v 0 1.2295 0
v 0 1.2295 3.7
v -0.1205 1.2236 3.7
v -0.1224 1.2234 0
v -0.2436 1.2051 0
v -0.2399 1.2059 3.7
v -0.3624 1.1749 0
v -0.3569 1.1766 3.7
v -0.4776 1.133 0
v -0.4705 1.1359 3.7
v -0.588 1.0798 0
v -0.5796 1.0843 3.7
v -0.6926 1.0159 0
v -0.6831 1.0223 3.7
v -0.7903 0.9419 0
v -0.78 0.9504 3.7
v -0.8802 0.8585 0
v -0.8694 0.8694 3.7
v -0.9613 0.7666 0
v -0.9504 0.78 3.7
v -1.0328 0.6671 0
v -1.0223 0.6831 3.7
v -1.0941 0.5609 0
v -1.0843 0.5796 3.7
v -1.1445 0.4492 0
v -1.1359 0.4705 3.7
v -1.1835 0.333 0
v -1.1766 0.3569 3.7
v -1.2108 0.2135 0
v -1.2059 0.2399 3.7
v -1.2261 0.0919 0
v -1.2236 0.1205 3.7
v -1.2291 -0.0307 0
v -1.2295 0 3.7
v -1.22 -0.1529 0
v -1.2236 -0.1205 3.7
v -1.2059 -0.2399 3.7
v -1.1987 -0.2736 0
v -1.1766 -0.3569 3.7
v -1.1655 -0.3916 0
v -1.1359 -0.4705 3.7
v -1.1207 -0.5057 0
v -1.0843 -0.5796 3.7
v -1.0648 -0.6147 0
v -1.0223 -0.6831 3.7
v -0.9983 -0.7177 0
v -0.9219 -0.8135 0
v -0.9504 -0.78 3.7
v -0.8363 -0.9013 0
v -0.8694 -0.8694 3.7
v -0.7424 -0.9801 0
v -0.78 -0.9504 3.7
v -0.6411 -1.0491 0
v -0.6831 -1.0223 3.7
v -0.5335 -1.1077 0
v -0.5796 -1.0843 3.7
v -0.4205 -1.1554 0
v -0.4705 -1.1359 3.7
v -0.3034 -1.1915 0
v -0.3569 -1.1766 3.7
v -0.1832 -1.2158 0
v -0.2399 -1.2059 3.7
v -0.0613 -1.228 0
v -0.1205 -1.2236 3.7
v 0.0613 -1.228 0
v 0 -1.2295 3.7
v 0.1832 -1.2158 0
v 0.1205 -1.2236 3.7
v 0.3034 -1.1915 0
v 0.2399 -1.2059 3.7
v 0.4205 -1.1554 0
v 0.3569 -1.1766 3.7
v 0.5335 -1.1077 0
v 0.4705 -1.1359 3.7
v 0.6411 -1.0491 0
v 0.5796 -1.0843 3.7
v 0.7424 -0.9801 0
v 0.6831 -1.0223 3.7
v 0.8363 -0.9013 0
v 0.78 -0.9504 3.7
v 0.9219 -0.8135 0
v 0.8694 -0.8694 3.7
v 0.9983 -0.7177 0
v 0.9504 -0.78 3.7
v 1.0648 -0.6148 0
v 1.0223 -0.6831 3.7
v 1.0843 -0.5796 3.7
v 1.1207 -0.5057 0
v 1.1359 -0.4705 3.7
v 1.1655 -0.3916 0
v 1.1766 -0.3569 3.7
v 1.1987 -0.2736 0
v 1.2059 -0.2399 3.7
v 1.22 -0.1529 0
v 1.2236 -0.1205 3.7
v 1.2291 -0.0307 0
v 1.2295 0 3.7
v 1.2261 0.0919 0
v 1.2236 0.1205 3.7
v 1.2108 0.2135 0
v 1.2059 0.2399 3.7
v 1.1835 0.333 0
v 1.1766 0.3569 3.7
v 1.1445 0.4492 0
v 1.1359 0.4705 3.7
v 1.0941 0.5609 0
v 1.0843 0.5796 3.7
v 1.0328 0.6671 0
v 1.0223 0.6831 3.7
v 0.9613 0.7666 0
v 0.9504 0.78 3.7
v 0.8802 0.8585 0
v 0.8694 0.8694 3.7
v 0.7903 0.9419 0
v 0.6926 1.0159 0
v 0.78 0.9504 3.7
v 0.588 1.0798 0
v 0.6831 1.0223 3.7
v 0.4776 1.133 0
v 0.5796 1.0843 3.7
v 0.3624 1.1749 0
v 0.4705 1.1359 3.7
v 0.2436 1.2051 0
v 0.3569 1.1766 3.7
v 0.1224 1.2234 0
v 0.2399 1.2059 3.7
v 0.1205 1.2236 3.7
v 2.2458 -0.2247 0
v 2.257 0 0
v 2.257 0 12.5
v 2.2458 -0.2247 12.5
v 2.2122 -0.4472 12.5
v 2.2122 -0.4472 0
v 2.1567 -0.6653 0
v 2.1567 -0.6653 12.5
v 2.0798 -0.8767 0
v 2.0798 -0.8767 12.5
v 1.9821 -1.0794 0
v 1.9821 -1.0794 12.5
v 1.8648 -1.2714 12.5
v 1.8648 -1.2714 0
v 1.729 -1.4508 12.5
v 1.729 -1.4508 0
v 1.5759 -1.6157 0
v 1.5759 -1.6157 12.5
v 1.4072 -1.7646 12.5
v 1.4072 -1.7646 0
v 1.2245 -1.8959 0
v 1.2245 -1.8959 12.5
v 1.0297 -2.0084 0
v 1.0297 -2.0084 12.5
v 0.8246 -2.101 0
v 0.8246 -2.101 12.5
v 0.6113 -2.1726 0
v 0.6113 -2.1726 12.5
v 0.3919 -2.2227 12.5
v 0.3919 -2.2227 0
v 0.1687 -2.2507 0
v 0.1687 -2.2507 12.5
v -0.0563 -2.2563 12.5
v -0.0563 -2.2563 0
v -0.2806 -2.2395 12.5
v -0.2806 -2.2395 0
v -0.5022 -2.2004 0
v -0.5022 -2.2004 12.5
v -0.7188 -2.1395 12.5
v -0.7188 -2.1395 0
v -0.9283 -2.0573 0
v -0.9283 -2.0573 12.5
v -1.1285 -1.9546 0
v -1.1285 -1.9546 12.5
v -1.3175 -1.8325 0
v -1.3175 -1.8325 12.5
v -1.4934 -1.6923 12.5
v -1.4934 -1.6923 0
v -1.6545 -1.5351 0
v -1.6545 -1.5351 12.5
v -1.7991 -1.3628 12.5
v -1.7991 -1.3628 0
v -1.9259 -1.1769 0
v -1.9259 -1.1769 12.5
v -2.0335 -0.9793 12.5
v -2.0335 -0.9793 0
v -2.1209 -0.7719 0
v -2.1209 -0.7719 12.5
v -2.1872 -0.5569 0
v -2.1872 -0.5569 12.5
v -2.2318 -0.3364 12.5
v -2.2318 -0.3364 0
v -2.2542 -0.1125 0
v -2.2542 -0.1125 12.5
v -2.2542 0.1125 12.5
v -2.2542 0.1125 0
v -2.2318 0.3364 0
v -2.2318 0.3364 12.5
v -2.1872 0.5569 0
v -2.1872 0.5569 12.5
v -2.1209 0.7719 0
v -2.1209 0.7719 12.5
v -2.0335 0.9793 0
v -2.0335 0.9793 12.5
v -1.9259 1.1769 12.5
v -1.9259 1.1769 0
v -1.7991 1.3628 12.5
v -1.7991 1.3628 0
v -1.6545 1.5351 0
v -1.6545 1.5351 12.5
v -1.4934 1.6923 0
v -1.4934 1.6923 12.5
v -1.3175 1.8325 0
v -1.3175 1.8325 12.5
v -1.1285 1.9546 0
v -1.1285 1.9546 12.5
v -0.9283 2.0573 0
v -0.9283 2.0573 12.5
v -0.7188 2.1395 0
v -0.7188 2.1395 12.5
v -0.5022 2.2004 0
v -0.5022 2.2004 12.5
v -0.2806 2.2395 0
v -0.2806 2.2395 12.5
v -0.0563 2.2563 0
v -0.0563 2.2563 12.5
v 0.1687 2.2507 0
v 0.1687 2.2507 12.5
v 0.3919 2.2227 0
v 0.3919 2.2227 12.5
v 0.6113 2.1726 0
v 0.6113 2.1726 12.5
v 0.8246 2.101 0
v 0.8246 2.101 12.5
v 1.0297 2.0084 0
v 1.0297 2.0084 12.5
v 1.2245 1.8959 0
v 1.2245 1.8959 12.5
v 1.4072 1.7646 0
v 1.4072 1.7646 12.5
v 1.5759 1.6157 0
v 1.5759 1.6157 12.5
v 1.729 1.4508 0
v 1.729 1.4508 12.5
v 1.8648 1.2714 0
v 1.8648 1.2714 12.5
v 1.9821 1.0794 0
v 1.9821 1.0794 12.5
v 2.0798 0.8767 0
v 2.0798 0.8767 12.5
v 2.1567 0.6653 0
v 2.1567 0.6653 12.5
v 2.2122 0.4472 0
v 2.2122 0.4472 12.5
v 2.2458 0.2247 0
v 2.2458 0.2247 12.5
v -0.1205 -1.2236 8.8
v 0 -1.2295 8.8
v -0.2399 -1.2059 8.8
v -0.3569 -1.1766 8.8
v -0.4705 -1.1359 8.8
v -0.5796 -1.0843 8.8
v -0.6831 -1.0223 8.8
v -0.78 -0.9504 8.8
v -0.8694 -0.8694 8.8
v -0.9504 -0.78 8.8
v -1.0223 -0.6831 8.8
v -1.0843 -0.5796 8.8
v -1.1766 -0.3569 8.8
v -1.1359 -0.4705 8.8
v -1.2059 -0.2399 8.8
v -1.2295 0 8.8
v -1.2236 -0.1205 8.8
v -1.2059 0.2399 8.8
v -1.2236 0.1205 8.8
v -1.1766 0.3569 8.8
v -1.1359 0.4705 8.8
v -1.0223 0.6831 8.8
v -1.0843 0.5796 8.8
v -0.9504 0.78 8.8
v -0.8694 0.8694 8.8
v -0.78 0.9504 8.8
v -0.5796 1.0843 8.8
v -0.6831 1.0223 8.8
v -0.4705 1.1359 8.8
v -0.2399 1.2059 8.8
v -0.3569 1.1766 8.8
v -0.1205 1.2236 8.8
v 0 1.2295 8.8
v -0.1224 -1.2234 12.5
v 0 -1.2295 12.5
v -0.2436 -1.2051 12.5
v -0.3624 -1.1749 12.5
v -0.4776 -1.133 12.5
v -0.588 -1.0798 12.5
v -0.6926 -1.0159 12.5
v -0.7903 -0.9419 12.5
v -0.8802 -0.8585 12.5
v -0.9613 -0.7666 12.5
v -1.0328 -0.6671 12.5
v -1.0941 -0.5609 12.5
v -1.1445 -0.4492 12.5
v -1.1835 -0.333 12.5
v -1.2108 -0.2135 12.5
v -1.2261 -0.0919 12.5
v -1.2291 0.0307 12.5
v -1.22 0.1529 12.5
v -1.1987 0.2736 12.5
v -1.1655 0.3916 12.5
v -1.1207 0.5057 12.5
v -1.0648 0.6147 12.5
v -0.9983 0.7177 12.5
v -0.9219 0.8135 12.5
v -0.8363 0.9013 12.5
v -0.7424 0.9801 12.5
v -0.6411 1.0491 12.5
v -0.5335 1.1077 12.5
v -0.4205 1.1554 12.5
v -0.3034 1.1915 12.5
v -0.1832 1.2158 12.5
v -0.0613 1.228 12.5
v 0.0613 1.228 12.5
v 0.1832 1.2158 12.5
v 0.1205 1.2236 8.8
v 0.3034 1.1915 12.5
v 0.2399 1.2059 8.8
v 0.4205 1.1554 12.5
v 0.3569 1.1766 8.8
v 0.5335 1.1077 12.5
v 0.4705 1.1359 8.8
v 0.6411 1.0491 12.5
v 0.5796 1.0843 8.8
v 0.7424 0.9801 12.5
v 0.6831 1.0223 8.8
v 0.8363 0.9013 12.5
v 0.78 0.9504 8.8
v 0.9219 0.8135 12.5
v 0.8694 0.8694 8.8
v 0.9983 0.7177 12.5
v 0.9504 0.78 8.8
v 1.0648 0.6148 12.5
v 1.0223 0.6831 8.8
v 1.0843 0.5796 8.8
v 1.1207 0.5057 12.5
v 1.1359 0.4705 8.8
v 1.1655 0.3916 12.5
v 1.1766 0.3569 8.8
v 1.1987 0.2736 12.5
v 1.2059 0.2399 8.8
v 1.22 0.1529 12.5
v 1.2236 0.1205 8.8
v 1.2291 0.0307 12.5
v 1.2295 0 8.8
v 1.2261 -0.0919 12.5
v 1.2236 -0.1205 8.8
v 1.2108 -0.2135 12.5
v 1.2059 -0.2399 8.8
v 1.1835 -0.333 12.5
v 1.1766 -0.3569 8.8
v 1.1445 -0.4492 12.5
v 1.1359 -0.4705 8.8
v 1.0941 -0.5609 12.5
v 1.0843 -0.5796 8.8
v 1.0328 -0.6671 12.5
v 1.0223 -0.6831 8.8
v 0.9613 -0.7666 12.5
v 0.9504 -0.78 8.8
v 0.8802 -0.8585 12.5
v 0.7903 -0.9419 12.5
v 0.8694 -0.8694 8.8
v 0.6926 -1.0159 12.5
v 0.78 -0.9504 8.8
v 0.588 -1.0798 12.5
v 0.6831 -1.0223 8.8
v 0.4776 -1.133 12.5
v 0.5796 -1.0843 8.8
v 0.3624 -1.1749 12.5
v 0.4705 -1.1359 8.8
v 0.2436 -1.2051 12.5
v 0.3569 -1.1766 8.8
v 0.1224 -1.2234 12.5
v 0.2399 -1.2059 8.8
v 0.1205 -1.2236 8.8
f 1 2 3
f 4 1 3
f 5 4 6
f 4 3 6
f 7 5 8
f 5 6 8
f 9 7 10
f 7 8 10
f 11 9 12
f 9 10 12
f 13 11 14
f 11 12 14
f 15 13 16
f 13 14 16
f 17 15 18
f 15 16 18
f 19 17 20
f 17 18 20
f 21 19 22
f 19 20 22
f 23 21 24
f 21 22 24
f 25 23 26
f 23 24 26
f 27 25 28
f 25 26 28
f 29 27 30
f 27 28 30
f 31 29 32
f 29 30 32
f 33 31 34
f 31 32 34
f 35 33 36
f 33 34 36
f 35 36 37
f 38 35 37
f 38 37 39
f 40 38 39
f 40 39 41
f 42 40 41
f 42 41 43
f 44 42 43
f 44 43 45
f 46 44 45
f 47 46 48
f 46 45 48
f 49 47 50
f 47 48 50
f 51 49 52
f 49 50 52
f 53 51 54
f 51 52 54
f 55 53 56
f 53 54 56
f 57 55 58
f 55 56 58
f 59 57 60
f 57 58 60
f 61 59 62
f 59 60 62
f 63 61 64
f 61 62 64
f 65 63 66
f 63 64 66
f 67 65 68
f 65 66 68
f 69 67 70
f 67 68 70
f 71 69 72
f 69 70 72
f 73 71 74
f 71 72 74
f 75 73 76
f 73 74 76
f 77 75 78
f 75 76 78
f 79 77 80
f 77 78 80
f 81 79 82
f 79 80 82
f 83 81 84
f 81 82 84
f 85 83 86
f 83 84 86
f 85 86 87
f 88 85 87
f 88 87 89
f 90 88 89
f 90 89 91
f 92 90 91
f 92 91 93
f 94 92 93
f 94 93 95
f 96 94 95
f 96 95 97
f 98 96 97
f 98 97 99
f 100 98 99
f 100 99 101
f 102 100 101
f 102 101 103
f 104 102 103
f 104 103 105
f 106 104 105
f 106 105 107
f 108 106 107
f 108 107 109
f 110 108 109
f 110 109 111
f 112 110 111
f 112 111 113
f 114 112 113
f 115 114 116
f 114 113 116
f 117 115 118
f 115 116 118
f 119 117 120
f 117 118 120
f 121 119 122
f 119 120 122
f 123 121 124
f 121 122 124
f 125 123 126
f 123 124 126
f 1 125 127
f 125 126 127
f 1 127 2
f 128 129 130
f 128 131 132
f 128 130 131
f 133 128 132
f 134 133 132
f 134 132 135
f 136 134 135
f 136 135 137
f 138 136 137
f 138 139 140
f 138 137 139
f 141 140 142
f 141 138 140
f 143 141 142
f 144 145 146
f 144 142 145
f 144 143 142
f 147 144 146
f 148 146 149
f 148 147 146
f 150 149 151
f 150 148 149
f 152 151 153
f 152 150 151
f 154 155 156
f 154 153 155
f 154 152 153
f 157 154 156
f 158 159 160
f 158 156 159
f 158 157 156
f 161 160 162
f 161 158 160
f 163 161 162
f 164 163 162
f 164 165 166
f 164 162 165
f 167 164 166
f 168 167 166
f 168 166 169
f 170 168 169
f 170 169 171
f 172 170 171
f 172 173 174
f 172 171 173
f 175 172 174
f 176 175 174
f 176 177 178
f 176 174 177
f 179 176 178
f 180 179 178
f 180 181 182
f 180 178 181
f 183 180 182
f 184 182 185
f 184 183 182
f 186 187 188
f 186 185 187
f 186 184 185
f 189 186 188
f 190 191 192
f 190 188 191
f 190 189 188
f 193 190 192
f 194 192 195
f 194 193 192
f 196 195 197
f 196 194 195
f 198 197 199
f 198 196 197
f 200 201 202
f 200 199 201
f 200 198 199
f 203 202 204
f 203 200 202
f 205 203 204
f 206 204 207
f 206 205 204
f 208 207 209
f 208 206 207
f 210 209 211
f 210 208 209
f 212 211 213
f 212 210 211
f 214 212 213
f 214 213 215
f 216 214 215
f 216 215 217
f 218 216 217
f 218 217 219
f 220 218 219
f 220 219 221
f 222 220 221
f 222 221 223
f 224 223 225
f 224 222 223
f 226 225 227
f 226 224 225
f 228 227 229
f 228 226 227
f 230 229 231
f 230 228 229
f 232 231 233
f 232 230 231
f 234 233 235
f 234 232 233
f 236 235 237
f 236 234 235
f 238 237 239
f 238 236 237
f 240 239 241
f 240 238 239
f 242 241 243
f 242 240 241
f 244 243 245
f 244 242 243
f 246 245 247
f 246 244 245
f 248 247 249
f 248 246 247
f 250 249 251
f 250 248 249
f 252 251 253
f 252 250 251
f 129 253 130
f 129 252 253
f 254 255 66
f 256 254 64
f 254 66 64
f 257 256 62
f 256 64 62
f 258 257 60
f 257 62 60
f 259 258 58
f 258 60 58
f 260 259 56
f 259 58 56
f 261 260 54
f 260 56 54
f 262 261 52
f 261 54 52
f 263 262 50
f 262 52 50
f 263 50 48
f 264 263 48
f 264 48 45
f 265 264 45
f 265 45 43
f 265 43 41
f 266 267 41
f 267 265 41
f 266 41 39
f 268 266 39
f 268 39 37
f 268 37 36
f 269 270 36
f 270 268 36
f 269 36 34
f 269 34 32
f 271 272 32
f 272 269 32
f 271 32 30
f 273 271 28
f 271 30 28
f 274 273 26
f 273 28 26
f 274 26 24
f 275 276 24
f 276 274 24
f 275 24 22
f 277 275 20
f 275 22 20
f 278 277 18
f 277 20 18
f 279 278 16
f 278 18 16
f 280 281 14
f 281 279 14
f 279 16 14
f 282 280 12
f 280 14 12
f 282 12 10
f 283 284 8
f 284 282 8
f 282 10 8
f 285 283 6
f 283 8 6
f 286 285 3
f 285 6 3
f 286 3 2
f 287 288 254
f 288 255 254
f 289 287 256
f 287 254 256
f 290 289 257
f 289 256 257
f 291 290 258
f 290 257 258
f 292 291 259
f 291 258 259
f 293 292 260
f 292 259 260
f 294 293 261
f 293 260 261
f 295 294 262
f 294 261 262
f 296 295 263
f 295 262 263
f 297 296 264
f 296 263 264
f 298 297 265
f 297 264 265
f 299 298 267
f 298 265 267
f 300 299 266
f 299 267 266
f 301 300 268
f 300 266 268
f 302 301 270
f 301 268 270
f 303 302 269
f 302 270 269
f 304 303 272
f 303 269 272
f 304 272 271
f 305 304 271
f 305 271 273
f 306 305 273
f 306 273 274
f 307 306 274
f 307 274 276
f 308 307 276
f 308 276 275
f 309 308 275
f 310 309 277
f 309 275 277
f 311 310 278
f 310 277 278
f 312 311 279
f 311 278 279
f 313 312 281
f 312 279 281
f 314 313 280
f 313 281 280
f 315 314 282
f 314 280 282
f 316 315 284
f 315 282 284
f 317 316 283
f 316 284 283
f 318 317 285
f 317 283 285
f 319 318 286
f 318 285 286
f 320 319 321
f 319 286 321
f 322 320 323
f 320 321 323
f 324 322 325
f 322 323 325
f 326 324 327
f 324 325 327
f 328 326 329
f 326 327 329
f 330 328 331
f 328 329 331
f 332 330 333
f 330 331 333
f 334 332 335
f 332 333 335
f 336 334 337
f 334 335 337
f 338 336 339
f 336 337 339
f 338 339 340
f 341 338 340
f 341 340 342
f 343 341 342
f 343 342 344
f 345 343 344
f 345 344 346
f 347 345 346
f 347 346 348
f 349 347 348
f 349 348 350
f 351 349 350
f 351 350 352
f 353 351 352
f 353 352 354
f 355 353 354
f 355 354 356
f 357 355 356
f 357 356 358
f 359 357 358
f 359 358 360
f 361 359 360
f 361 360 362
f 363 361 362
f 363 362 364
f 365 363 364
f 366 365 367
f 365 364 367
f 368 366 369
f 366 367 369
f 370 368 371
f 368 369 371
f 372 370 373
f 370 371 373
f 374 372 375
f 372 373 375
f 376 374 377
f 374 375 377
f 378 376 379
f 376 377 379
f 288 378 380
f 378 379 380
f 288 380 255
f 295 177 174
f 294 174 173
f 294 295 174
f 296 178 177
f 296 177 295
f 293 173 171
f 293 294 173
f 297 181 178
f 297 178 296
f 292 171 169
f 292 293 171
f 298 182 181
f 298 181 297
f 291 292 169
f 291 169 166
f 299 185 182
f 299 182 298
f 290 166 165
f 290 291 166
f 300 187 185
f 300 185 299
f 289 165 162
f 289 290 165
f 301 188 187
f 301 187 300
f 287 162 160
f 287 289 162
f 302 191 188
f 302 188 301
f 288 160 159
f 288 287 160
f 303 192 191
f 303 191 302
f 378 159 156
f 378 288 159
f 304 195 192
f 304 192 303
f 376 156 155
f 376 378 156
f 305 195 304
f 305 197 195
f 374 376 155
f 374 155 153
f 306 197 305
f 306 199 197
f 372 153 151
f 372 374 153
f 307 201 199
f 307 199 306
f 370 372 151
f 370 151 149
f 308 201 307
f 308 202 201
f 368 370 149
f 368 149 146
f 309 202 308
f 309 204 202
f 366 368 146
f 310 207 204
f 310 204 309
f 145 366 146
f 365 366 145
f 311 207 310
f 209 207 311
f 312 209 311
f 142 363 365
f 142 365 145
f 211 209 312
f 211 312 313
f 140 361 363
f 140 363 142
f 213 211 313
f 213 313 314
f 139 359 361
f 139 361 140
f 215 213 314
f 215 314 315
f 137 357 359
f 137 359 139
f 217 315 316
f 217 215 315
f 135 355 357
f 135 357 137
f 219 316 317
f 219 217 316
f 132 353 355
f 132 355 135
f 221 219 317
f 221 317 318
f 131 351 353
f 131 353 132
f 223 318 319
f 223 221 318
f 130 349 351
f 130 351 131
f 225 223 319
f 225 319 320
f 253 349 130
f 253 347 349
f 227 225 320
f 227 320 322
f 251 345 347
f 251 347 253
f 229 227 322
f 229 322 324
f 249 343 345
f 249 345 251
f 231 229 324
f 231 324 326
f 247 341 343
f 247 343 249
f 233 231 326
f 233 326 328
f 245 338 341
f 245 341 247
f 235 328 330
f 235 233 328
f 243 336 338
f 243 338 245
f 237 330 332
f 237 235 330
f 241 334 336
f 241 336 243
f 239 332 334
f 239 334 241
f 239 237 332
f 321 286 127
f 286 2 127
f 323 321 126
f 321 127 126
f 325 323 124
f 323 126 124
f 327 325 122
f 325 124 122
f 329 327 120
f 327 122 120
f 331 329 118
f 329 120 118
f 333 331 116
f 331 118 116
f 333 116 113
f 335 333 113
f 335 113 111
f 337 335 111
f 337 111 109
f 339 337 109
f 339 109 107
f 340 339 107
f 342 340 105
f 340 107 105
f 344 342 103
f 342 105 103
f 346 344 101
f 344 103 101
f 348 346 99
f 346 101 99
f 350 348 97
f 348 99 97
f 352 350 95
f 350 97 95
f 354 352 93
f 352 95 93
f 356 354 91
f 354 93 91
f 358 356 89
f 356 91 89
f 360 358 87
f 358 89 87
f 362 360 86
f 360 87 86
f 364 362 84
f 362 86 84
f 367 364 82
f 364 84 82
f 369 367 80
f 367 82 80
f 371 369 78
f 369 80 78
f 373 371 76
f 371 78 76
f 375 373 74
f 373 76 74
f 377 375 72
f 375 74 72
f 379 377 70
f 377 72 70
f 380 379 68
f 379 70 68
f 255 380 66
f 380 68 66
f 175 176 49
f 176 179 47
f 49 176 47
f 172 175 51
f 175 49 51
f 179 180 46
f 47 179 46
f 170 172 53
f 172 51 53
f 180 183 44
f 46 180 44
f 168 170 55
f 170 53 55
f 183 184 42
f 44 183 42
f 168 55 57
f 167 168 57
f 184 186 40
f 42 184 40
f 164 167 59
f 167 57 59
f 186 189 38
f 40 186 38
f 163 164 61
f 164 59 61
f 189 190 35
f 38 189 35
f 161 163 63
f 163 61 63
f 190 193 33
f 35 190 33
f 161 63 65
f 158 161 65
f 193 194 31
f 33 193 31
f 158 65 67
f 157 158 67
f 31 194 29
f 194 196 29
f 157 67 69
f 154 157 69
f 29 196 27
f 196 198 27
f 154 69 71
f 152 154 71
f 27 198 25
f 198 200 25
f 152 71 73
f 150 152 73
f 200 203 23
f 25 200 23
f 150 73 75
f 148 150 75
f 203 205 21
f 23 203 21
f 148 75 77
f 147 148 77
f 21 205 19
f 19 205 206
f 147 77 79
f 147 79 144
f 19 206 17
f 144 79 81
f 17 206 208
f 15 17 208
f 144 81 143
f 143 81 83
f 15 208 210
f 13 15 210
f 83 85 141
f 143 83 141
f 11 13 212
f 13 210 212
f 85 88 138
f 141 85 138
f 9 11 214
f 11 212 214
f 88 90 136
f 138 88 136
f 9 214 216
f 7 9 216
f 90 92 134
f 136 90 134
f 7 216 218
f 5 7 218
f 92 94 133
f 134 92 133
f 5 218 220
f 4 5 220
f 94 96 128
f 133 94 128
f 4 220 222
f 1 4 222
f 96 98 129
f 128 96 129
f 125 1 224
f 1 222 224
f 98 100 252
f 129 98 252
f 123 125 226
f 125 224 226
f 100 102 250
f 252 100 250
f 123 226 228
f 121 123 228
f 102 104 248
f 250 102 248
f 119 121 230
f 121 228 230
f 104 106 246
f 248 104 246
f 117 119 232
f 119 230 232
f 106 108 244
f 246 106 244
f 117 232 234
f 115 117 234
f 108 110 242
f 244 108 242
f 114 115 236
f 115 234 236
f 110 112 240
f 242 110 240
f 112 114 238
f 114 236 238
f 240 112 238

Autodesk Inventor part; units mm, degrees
ref_plane "YZ Plane" through (0, 0, 0) normal (1, 0, 0) x (0, 1, 0)
ref_plane "XZ Plane" through (0, 0, 0) normal (0, 1, 0) x (-1, 0, 0)
ref_plane "XY Plane" through (0, 0, 0) normal (0, 0, 1) x (1, 0, 0)
sketch "スケッチ1" plane through (0, 0, 0) normal (0, 0, 1) x (1, 0, 0)
  circle A0 centre (0, 0) radius 2.257
  dimension "d0" = 4.514
extrude "押し出し1" add sketch "スケッチ1" along normal blind 12.5
sketch "スケッチ2" plane through (0, 0, 12.5) normal (0, 0, 1) x (1, 0, 0)
  circle A0 centre (0, 0) radius 2.257 projected
hole "穴1" at (0, 0, 12.5) direction (0, 0, -1) diameter 2.459 depth 8.8 tip angle 118 thread size "M3x0.5" class "6H" standard "ANSI Metric M Profile"
sketch "スケッチ3" plane through (0, 0, 0) normal (0, 0, -1) x (-1, 0, 0)
  circle A0 centre (0, 0) radius 2.257 projected
hole "穴2" at (0, 0, 0) direction (0, 0, 1) diameter 2.459 depth 8.8 tip angle 118 thread size "M3x0.5" class "6H" standard "ANSI Metric M Profile"
properties part number "Shaf"
